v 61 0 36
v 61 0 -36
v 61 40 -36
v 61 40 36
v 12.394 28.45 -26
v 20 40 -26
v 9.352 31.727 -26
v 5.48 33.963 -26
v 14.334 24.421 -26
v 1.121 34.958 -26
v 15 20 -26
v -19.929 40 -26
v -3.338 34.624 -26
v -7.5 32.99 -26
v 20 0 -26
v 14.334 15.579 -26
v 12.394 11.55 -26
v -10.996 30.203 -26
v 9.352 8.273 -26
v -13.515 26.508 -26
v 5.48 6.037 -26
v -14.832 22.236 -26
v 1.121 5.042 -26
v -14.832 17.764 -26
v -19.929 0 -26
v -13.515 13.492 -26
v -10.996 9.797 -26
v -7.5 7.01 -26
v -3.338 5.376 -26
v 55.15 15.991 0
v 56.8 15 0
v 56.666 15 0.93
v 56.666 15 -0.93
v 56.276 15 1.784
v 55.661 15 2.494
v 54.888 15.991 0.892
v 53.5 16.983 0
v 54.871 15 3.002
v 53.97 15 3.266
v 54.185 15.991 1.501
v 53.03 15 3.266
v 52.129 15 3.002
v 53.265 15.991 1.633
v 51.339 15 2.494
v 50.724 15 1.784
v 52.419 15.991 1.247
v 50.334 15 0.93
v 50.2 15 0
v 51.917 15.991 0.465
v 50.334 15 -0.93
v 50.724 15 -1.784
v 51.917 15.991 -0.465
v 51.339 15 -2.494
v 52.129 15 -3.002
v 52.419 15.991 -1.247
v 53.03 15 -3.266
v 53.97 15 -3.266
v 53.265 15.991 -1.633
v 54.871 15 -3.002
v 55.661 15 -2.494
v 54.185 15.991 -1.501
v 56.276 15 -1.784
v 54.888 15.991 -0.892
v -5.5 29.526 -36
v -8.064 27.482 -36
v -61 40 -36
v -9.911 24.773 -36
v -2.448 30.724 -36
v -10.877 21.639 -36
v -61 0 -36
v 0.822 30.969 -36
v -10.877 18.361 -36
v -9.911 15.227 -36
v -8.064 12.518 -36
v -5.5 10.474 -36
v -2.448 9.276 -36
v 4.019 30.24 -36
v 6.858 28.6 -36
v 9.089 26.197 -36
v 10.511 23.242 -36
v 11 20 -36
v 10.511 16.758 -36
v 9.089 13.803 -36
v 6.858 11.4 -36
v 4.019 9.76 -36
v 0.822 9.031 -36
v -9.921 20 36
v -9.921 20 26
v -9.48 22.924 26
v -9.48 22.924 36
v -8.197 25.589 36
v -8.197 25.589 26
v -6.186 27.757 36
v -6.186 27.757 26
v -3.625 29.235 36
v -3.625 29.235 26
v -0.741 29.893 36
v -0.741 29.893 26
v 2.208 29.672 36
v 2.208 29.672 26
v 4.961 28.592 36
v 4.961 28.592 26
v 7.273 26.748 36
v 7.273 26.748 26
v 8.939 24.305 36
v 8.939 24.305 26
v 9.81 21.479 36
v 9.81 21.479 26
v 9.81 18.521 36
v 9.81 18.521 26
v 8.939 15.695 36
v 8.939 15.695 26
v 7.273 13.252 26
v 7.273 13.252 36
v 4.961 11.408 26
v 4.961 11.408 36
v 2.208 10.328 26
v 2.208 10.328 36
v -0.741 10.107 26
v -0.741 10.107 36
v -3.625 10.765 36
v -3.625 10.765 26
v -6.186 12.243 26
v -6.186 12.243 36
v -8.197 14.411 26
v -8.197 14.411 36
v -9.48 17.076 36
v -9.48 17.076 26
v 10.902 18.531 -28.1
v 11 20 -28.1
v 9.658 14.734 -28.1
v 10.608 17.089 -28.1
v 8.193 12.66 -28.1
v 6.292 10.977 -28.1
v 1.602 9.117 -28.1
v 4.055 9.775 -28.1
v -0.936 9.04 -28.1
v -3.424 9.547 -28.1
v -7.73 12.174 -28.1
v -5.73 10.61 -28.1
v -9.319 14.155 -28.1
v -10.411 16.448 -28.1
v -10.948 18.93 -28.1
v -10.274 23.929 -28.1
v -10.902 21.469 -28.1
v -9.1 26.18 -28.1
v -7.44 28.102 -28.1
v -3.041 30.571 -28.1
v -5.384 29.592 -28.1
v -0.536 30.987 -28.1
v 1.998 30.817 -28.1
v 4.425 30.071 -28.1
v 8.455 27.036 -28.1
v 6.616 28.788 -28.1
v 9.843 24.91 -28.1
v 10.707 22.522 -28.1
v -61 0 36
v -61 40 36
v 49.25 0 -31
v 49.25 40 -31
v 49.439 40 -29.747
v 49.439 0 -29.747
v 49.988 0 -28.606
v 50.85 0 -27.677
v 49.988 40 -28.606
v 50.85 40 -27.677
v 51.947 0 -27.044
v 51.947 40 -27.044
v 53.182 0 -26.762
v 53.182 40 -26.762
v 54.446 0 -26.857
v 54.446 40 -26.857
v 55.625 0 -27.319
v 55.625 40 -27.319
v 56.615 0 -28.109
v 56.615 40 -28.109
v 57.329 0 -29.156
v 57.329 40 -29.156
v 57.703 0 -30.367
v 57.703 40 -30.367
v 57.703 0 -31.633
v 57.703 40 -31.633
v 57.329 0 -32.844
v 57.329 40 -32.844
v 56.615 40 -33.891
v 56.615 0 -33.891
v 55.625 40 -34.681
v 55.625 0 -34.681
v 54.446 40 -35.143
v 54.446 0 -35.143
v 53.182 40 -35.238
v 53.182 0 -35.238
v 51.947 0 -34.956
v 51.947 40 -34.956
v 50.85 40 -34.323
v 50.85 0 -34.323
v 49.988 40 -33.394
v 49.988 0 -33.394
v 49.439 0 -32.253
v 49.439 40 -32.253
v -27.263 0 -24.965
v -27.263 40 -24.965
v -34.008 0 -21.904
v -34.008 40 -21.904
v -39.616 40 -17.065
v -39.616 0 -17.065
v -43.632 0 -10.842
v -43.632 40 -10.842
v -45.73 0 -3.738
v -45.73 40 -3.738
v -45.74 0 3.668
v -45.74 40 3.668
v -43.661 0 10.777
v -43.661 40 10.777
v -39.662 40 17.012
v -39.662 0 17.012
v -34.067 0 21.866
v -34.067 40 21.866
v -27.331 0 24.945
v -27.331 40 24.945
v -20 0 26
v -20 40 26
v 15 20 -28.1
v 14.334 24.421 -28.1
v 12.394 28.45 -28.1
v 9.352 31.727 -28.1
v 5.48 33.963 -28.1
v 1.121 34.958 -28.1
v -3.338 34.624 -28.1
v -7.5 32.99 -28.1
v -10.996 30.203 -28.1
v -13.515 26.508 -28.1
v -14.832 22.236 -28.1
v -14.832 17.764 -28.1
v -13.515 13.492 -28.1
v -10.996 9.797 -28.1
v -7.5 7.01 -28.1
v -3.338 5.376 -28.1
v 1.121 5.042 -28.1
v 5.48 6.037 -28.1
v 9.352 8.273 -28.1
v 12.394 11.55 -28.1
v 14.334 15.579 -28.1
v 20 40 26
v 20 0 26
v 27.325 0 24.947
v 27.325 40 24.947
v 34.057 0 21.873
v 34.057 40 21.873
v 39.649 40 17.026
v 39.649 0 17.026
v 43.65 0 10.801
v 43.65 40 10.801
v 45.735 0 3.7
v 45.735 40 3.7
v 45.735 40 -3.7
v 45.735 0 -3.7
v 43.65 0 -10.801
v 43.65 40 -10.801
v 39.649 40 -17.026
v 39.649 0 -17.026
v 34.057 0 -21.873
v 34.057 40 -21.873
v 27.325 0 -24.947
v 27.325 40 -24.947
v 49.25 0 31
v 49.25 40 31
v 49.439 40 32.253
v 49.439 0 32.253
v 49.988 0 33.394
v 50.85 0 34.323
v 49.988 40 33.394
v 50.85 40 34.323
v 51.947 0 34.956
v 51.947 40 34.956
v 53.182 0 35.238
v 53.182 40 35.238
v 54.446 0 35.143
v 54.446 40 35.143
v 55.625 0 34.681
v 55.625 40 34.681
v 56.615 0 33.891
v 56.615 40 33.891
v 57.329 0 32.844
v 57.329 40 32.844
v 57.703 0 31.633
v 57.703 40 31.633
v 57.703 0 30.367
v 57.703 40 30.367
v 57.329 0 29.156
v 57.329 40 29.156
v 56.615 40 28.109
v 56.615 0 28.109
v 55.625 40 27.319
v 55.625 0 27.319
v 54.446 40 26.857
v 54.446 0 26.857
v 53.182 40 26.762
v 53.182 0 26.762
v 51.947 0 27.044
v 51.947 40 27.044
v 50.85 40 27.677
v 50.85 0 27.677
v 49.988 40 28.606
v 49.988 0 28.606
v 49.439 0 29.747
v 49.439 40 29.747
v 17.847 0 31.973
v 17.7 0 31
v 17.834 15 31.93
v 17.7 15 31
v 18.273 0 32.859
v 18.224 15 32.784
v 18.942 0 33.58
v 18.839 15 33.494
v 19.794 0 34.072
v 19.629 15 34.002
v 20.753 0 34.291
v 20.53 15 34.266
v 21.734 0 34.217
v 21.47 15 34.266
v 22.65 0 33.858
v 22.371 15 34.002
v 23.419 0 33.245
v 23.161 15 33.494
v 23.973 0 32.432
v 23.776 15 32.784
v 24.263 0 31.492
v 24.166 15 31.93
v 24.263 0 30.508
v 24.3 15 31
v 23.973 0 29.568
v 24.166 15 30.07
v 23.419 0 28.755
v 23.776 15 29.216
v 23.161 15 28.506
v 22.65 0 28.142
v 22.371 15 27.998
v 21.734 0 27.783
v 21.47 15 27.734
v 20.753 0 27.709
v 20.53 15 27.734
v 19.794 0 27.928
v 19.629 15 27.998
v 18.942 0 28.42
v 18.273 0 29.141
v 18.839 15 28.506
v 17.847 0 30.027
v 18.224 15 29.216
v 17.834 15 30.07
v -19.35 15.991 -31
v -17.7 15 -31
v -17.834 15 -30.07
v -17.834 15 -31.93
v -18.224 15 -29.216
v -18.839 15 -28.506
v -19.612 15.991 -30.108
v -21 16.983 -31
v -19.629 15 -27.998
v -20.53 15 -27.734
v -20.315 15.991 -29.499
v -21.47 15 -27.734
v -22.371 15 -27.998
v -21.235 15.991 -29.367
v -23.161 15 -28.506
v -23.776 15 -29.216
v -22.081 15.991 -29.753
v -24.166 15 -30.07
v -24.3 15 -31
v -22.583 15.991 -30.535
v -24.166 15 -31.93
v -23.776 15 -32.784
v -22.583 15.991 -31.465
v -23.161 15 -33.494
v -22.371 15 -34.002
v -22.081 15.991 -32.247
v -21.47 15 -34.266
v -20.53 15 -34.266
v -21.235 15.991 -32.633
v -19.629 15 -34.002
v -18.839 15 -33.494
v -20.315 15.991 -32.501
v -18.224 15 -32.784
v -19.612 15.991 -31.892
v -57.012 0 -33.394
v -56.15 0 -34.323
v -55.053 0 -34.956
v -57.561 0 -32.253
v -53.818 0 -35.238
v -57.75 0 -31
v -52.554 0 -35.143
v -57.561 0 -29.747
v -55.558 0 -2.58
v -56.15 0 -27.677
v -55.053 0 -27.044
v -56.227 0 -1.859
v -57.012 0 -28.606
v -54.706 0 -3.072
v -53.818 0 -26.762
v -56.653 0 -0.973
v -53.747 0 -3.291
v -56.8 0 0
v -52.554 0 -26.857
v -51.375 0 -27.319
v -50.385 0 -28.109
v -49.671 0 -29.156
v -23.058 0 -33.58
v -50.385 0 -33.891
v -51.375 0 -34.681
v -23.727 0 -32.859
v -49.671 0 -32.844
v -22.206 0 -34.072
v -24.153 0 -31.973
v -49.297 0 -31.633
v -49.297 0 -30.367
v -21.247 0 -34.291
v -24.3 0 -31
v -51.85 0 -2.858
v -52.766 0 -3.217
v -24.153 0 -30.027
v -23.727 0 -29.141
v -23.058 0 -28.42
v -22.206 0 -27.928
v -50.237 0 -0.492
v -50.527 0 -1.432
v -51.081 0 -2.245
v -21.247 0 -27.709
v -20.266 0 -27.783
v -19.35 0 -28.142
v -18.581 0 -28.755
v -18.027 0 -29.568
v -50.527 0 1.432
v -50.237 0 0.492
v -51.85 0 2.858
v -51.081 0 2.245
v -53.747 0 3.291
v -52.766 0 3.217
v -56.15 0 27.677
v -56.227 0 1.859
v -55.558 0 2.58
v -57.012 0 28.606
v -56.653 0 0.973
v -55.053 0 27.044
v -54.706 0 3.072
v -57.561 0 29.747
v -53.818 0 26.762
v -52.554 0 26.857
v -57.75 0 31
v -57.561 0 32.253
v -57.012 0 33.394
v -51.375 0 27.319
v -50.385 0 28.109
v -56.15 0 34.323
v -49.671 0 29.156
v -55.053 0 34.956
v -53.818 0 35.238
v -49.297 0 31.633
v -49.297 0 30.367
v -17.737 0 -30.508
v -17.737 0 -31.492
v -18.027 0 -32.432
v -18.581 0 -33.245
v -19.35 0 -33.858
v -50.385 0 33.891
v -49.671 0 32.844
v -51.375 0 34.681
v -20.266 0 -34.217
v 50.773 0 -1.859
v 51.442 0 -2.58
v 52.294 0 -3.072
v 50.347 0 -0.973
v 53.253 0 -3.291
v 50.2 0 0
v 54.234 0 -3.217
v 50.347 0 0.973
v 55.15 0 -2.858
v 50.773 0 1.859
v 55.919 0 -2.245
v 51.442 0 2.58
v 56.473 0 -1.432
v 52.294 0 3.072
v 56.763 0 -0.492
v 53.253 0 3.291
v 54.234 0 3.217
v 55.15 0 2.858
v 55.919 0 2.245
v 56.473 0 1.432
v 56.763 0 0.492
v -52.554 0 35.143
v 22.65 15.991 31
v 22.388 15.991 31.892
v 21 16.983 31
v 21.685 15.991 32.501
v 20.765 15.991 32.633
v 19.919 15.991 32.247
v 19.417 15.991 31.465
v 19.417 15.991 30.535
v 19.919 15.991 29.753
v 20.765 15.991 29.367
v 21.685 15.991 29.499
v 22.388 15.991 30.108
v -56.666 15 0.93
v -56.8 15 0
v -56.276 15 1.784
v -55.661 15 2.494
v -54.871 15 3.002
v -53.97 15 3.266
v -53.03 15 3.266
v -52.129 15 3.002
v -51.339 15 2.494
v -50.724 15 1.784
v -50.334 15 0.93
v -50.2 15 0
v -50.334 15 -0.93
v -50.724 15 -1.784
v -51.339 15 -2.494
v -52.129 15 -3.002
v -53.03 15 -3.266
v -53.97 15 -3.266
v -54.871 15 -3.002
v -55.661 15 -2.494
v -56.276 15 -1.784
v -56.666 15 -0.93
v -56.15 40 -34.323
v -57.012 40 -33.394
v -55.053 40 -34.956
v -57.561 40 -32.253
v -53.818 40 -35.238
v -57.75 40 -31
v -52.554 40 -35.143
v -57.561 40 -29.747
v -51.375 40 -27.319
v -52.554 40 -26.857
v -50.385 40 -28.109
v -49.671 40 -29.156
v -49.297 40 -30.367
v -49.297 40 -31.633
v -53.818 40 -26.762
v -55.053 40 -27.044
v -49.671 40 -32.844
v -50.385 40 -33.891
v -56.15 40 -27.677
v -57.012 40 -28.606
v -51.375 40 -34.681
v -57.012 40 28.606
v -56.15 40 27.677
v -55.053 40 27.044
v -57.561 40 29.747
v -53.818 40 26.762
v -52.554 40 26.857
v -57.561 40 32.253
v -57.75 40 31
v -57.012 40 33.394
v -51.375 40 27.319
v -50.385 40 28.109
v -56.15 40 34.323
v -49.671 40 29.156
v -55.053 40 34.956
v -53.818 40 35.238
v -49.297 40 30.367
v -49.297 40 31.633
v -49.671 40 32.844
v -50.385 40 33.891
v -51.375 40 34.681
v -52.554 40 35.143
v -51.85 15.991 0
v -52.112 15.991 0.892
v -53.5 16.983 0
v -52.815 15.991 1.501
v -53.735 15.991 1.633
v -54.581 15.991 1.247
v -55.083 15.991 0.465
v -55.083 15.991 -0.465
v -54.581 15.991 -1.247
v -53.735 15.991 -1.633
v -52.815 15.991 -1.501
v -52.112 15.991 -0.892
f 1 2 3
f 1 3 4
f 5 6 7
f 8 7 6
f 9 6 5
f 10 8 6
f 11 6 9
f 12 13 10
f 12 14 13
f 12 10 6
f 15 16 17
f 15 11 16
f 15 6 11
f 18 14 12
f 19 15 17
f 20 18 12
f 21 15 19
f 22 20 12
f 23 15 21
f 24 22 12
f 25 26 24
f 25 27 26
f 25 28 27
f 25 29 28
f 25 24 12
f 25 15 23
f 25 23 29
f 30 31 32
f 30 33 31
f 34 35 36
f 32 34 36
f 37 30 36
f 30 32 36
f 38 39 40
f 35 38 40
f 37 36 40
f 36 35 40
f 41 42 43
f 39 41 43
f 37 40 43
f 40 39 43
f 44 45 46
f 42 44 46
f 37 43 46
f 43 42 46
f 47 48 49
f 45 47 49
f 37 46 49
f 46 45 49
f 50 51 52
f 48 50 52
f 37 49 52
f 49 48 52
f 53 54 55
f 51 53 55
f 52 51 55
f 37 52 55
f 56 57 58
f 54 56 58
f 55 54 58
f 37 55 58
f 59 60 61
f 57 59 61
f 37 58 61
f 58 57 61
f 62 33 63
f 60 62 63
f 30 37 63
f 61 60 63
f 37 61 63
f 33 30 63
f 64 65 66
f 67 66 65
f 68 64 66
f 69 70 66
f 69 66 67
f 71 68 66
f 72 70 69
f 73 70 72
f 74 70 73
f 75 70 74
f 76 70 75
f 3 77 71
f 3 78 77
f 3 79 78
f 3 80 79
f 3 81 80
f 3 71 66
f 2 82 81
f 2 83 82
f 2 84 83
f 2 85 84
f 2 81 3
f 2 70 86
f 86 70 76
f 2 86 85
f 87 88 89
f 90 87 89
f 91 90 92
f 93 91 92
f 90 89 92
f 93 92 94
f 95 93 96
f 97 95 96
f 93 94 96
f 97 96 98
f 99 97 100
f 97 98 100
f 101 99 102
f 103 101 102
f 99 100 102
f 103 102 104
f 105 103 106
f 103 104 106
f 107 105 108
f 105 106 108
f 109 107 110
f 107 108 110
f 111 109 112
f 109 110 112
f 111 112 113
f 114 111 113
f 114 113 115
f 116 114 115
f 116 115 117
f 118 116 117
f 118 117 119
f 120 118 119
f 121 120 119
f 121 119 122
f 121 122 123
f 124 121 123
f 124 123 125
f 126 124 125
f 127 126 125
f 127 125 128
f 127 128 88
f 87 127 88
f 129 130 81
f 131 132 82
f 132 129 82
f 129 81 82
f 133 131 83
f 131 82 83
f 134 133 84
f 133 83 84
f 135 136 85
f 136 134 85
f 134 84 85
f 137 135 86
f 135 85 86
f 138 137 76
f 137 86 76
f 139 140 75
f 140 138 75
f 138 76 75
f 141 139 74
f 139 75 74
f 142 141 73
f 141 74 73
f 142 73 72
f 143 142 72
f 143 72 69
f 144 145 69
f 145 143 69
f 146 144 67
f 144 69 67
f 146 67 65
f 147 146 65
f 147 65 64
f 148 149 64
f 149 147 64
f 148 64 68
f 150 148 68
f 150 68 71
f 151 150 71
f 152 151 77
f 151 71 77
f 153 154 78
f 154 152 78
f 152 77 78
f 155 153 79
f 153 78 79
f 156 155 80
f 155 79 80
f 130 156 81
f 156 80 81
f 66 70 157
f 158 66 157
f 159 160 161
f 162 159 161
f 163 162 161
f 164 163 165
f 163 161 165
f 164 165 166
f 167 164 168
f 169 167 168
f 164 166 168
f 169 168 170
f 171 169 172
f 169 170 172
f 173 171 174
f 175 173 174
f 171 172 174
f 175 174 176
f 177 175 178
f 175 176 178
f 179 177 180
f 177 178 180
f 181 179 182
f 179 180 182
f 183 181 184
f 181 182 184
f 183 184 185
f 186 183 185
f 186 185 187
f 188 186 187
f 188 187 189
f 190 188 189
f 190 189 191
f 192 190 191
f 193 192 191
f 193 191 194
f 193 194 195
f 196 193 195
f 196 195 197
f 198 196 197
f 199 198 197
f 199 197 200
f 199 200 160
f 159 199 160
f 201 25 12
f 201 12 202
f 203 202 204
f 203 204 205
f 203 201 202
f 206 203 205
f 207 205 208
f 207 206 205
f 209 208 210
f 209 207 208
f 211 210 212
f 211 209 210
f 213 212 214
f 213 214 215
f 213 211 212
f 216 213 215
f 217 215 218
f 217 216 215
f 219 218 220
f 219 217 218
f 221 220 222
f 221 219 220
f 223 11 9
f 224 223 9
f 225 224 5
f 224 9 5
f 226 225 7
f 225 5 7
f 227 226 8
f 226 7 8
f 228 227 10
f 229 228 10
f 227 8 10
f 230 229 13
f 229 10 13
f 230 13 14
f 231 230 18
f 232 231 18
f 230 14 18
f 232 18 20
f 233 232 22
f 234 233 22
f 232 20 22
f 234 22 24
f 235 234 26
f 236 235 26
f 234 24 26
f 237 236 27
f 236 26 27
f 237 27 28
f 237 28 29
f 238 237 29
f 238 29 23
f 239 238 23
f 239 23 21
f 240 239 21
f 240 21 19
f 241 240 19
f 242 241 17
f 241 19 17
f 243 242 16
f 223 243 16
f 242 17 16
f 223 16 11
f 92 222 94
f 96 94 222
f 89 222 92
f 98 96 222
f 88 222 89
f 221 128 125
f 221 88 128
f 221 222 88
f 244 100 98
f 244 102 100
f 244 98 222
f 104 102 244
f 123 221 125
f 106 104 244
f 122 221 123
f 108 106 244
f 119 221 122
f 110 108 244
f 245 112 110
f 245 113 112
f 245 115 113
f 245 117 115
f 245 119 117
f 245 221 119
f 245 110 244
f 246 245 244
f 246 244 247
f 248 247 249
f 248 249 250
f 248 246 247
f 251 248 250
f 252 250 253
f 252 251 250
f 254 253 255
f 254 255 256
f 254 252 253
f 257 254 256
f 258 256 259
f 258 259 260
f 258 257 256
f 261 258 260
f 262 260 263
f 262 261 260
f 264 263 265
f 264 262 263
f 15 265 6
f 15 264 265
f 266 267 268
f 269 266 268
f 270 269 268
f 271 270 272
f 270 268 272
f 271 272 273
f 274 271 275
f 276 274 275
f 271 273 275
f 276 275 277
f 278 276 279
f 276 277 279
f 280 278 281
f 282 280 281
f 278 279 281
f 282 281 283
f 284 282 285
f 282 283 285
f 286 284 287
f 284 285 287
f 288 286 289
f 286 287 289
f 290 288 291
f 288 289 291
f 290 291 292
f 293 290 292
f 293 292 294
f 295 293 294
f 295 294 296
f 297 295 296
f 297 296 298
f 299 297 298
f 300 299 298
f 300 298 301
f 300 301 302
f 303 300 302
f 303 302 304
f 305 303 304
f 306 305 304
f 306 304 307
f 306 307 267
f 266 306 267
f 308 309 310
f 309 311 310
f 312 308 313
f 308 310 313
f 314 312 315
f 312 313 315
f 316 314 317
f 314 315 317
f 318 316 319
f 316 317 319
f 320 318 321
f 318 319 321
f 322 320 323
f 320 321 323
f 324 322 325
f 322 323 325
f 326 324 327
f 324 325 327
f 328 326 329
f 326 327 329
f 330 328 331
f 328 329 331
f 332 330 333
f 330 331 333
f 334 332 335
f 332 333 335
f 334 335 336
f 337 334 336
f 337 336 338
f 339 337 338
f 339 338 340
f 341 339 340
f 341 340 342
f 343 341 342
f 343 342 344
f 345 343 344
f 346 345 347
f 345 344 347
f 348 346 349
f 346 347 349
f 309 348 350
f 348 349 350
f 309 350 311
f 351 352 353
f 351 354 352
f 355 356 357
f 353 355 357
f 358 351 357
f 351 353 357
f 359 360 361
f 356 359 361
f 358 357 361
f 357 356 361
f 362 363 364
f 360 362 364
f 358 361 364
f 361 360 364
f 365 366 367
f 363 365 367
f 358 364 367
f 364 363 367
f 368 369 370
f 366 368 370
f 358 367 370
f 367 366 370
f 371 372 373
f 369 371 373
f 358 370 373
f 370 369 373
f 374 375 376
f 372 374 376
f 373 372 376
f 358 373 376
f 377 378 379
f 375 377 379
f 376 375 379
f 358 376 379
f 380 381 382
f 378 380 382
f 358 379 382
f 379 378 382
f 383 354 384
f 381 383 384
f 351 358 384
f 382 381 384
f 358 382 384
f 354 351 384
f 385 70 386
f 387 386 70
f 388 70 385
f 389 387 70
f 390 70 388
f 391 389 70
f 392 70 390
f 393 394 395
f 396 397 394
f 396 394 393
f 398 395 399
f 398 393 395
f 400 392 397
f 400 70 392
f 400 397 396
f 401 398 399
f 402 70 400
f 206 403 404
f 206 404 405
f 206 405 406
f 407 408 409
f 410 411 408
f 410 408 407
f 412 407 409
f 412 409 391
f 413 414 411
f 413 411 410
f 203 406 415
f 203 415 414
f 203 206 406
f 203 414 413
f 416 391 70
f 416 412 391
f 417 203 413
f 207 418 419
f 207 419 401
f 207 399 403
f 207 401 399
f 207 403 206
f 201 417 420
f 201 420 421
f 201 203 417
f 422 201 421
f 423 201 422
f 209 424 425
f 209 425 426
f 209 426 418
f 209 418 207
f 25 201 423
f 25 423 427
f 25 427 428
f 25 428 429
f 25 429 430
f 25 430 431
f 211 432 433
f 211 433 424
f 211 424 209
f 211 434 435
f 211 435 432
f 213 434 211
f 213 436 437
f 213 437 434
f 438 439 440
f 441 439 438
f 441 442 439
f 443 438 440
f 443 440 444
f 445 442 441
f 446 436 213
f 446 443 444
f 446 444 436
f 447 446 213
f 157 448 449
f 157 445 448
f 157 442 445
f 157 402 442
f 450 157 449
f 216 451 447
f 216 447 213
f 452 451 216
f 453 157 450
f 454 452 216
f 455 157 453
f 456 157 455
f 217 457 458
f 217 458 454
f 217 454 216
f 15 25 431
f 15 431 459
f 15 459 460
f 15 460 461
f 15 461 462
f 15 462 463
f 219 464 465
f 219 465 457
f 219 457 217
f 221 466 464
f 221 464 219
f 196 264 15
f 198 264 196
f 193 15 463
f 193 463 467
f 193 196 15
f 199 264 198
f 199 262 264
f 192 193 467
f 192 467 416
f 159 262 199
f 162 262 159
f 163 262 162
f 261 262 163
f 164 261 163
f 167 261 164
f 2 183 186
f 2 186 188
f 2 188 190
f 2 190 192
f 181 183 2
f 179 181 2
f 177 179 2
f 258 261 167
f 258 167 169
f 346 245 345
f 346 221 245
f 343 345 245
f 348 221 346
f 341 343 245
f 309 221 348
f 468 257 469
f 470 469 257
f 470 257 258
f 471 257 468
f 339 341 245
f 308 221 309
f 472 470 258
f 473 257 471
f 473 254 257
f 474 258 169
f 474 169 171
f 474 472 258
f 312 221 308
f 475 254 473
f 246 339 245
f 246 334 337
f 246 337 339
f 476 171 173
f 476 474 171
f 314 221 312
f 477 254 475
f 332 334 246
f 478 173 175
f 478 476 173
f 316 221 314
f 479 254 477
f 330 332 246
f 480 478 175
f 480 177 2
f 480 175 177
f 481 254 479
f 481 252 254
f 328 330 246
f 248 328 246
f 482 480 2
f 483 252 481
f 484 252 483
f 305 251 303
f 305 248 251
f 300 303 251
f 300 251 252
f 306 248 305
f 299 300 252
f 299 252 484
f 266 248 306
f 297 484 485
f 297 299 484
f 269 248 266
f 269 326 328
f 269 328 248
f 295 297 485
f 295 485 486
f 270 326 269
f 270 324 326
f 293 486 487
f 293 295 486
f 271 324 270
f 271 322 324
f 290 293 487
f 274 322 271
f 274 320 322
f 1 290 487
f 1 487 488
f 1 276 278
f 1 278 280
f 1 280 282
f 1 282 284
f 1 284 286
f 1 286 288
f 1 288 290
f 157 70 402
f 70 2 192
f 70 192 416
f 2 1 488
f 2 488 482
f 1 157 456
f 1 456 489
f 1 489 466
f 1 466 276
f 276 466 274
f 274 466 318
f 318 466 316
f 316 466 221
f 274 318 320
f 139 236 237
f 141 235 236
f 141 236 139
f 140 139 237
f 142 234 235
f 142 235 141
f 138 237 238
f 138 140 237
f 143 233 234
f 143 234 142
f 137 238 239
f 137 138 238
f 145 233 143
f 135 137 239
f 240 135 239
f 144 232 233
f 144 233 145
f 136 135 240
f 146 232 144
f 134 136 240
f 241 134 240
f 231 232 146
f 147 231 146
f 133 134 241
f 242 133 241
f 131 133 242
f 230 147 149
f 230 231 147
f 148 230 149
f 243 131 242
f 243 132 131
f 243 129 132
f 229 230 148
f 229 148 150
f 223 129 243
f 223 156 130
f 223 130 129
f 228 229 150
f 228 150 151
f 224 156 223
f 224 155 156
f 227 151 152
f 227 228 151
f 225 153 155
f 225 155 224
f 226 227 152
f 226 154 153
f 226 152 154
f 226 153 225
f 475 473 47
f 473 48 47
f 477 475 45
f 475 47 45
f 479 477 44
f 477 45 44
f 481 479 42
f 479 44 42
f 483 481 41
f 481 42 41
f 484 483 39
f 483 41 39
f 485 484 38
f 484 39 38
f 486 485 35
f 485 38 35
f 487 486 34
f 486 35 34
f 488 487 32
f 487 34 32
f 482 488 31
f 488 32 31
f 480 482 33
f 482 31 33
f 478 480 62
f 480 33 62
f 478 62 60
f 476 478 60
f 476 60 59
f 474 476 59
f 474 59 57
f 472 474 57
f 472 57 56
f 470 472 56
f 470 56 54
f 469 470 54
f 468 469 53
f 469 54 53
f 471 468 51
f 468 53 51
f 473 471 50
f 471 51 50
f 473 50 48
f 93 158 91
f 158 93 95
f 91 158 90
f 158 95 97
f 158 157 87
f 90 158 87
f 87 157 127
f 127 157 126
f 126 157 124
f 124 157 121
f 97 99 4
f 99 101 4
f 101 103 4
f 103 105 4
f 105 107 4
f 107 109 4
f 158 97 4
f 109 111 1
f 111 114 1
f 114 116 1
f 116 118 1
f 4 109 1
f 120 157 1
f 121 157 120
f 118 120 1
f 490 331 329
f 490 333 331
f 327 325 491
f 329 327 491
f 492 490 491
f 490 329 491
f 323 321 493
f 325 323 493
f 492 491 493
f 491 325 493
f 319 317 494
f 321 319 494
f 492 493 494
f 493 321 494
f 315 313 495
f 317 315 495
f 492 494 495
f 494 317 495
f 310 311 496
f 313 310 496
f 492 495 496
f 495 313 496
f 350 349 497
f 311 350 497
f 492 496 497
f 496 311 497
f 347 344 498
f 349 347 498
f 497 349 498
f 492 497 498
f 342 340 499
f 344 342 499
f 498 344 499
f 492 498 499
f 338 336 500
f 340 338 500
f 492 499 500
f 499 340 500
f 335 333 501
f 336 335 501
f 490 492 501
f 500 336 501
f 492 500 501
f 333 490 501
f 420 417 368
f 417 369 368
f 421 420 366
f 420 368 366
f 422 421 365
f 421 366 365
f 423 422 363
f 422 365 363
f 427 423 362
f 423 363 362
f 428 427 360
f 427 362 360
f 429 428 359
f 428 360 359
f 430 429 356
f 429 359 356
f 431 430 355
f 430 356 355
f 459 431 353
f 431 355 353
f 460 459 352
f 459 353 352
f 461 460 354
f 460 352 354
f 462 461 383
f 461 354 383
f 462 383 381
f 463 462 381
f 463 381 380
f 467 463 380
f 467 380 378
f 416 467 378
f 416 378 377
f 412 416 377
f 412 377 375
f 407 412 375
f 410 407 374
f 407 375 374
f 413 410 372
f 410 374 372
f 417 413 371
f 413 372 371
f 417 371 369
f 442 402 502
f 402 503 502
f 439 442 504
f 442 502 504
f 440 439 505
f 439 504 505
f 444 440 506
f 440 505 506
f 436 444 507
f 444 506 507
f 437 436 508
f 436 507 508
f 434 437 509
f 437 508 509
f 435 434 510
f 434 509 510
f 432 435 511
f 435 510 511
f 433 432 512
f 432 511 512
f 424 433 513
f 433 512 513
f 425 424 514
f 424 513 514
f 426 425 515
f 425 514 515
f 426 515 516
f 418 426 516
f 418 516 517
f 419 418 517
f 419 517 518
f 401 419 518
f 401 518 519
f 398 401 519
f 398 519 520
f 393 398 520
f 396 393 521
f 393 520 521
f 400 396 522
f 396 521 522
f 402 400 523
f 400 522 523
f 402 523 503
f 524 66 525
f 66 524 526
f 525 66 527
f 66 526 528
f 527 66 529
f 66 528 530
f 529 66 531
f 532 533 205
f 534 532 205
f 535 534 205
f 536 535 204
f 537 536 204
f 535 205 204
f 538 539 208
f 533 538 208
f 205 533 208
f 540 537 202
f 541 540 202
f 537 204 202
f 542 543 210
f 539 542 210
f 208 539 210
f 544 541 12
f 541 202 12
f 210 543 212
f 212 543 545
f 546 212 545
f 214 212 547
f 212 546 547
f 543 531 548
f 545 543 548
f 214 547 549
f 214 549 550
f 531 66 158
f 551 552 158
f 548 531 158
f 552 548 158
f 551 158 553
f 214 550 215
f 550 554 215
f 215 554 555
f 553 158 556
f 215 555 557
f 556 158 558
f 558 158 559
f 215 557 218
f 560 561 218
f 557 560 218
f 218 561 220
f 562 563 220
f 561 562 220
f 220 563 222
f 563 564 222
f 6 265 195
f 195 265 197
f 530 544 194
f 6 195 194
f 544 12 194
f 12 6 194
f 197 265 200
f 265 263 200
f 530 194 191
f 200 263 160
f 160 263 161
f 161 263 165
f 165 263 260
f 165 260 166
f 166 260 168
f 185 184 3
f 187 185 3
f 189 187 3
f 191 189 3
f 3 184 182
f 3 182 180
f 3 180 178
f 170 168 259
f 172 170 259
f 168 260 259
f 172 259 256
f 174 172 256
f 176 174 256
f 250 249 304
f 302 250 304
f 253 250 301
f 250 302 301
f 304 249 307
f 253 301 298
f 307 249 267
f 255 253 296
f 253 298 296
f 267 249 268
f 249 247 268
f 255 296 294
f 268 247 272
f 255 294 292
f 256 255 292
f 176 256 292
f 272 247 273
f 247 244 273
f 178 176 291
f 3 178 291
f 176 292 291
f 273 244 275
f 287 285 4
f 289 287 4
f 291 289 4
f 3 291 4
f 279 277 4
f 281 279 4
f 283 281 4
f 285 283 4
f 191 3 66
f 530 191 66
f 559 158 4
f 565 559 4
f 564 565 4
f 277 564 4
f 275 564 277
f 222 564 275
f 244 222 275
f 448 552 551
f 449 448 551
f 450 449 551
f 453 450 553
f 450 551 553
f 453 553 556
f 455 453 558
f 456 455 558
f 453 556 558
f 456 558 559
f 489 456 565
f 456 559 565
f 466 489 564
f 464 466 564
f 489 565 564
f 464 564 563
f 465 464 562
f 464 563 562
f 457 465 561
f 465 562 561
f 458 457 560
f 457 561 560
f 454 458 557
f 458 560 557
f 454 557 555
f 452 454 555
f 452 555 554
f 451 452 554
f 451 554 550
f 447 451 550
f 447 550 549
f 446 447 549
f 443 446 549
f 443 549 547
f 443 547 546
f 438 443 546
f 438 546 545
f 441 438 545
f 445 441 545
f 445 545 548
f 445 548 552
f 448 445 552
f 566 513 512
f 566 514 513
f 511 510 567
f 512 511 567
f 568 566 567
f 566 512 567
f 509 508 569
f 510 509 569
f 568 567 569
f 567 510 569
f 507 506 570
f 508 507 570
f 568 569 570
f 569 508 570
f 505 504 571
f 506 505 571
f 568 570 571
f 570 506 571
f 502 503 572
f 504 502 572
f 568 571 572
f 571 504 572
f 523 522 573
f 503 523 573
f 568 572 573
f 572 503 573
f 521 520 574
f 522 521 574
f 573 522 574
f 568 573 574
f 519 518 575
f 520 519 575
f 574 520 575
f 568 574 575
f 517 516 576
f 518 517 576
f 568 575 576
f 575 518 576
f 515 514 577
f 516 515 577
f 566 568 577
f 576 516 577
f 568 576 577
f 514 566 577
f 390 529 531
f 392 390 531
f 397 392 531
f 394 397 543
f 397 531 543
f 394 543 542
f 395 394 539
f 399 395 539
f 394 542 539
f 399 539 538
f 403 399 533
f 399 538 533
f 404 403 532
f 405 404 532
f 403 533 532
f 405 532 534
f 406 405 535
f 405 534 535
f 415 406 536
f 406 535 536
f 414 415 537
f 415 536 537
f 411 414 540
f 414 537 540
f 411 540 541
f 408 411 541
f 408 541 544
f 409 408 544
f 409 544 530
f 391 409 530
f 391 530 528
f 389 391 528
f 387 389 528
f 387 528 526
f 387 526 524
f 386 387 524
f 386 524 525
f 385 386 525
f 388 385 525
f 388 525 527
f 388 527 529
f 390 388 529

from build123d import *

# Parameters (mm, degrees)
F0_W     = 122
F0_H     = 72
F1_DEPTH = 40
F2_D     = 6.6
F2_DEPTH = 15
F2_TIP   = 1.9828400428
F3_D     = 8.5
F5_D     = 19.84248
F5_DEPTH = 15
F5_TIP   = 5.9612824079
F6_R     = 11
F7_DEPTH = 25
F8_R     = 15
F9_DEPTH = 2.1


with BuildPart() as f1:
    # F0 (on Front) → F1 (new body)
    with BuildSketch(Plane.XZ):
        Rectangle(F0_W, F0_H)
        with BuildLine():
            ThreePointArc((-19.9292801285, -25.999903821), (-45.9999759552, -0.0353599684), (-20, 26))
            Line((-20, 26), (20, 26))
            ThreePointArc((20, 26), (46, 0), (20, -26))
            Line((20, -26), (-19.9292801285, -25.999903821))
        make_face(mode=Mode.SUBTRACT)
    extrude(amount=-F1_DEPTH)

    # F2
    with Locations(Plane.XZ):
        with Locations((21, 31), (53.5, 0), (-21, -31), (-53.5, 0)):
            Hole(F2_D / 2, depth=F2_DEPTH)
            with Locations((0, 0, -(F2_DEPTH + F2_TIP / 2))):  # 118° drill point
                Cone(0, F2_D / 2, F2_TIP, mode=Mode.SUBTRACT)

    # F3 (through all)
    with Locations(Plane.XZ):
        with Locations((-53.5, 31), (-53.5, -31), (53.5, 31), (53.5, -31)):
            Hole(F3_D / 2)

    # F5
    with Locations(Plane.XY.offset(36)):
        with Locations((0, 20)):
            Hole(F5_D / 2, depth=F5_DEPTH)
            with Locations((0, 0, -(F5_DEPTH + F5_TIP / 2))):  # 118° drill point
                Cone(0, F5_D / 2, F5_TIP, mode=Mode.SUBTRACT)

    # F6 (on face) → F7 (cut)
    with BuildSketch(Plane(origin=(0, 0, -36), x_dir=(1, 0, 0), z_dir=(0, 0, -1))):
        with Locations((0, -20)):
            Circle(F6_R)
    extrude(amount=-F7_DEPTH, mode=Mode.SUBTRACT)

    # F8 (on face) → F9 (cut)
    with BuildSketch(Plane(origin=(-6.2627e-05, 0, -25.9999518252), x_dir=(1, 0, -2.4087e-06), z_dir=(2.4087e-06, 0, 1))):
        with Locations((6.2627e-05, 20)):
            Circle(F8_R)
    extrude(amount=-F9_DEPTH, mode=Mode.SUBTRACT)


solid = f1.part
